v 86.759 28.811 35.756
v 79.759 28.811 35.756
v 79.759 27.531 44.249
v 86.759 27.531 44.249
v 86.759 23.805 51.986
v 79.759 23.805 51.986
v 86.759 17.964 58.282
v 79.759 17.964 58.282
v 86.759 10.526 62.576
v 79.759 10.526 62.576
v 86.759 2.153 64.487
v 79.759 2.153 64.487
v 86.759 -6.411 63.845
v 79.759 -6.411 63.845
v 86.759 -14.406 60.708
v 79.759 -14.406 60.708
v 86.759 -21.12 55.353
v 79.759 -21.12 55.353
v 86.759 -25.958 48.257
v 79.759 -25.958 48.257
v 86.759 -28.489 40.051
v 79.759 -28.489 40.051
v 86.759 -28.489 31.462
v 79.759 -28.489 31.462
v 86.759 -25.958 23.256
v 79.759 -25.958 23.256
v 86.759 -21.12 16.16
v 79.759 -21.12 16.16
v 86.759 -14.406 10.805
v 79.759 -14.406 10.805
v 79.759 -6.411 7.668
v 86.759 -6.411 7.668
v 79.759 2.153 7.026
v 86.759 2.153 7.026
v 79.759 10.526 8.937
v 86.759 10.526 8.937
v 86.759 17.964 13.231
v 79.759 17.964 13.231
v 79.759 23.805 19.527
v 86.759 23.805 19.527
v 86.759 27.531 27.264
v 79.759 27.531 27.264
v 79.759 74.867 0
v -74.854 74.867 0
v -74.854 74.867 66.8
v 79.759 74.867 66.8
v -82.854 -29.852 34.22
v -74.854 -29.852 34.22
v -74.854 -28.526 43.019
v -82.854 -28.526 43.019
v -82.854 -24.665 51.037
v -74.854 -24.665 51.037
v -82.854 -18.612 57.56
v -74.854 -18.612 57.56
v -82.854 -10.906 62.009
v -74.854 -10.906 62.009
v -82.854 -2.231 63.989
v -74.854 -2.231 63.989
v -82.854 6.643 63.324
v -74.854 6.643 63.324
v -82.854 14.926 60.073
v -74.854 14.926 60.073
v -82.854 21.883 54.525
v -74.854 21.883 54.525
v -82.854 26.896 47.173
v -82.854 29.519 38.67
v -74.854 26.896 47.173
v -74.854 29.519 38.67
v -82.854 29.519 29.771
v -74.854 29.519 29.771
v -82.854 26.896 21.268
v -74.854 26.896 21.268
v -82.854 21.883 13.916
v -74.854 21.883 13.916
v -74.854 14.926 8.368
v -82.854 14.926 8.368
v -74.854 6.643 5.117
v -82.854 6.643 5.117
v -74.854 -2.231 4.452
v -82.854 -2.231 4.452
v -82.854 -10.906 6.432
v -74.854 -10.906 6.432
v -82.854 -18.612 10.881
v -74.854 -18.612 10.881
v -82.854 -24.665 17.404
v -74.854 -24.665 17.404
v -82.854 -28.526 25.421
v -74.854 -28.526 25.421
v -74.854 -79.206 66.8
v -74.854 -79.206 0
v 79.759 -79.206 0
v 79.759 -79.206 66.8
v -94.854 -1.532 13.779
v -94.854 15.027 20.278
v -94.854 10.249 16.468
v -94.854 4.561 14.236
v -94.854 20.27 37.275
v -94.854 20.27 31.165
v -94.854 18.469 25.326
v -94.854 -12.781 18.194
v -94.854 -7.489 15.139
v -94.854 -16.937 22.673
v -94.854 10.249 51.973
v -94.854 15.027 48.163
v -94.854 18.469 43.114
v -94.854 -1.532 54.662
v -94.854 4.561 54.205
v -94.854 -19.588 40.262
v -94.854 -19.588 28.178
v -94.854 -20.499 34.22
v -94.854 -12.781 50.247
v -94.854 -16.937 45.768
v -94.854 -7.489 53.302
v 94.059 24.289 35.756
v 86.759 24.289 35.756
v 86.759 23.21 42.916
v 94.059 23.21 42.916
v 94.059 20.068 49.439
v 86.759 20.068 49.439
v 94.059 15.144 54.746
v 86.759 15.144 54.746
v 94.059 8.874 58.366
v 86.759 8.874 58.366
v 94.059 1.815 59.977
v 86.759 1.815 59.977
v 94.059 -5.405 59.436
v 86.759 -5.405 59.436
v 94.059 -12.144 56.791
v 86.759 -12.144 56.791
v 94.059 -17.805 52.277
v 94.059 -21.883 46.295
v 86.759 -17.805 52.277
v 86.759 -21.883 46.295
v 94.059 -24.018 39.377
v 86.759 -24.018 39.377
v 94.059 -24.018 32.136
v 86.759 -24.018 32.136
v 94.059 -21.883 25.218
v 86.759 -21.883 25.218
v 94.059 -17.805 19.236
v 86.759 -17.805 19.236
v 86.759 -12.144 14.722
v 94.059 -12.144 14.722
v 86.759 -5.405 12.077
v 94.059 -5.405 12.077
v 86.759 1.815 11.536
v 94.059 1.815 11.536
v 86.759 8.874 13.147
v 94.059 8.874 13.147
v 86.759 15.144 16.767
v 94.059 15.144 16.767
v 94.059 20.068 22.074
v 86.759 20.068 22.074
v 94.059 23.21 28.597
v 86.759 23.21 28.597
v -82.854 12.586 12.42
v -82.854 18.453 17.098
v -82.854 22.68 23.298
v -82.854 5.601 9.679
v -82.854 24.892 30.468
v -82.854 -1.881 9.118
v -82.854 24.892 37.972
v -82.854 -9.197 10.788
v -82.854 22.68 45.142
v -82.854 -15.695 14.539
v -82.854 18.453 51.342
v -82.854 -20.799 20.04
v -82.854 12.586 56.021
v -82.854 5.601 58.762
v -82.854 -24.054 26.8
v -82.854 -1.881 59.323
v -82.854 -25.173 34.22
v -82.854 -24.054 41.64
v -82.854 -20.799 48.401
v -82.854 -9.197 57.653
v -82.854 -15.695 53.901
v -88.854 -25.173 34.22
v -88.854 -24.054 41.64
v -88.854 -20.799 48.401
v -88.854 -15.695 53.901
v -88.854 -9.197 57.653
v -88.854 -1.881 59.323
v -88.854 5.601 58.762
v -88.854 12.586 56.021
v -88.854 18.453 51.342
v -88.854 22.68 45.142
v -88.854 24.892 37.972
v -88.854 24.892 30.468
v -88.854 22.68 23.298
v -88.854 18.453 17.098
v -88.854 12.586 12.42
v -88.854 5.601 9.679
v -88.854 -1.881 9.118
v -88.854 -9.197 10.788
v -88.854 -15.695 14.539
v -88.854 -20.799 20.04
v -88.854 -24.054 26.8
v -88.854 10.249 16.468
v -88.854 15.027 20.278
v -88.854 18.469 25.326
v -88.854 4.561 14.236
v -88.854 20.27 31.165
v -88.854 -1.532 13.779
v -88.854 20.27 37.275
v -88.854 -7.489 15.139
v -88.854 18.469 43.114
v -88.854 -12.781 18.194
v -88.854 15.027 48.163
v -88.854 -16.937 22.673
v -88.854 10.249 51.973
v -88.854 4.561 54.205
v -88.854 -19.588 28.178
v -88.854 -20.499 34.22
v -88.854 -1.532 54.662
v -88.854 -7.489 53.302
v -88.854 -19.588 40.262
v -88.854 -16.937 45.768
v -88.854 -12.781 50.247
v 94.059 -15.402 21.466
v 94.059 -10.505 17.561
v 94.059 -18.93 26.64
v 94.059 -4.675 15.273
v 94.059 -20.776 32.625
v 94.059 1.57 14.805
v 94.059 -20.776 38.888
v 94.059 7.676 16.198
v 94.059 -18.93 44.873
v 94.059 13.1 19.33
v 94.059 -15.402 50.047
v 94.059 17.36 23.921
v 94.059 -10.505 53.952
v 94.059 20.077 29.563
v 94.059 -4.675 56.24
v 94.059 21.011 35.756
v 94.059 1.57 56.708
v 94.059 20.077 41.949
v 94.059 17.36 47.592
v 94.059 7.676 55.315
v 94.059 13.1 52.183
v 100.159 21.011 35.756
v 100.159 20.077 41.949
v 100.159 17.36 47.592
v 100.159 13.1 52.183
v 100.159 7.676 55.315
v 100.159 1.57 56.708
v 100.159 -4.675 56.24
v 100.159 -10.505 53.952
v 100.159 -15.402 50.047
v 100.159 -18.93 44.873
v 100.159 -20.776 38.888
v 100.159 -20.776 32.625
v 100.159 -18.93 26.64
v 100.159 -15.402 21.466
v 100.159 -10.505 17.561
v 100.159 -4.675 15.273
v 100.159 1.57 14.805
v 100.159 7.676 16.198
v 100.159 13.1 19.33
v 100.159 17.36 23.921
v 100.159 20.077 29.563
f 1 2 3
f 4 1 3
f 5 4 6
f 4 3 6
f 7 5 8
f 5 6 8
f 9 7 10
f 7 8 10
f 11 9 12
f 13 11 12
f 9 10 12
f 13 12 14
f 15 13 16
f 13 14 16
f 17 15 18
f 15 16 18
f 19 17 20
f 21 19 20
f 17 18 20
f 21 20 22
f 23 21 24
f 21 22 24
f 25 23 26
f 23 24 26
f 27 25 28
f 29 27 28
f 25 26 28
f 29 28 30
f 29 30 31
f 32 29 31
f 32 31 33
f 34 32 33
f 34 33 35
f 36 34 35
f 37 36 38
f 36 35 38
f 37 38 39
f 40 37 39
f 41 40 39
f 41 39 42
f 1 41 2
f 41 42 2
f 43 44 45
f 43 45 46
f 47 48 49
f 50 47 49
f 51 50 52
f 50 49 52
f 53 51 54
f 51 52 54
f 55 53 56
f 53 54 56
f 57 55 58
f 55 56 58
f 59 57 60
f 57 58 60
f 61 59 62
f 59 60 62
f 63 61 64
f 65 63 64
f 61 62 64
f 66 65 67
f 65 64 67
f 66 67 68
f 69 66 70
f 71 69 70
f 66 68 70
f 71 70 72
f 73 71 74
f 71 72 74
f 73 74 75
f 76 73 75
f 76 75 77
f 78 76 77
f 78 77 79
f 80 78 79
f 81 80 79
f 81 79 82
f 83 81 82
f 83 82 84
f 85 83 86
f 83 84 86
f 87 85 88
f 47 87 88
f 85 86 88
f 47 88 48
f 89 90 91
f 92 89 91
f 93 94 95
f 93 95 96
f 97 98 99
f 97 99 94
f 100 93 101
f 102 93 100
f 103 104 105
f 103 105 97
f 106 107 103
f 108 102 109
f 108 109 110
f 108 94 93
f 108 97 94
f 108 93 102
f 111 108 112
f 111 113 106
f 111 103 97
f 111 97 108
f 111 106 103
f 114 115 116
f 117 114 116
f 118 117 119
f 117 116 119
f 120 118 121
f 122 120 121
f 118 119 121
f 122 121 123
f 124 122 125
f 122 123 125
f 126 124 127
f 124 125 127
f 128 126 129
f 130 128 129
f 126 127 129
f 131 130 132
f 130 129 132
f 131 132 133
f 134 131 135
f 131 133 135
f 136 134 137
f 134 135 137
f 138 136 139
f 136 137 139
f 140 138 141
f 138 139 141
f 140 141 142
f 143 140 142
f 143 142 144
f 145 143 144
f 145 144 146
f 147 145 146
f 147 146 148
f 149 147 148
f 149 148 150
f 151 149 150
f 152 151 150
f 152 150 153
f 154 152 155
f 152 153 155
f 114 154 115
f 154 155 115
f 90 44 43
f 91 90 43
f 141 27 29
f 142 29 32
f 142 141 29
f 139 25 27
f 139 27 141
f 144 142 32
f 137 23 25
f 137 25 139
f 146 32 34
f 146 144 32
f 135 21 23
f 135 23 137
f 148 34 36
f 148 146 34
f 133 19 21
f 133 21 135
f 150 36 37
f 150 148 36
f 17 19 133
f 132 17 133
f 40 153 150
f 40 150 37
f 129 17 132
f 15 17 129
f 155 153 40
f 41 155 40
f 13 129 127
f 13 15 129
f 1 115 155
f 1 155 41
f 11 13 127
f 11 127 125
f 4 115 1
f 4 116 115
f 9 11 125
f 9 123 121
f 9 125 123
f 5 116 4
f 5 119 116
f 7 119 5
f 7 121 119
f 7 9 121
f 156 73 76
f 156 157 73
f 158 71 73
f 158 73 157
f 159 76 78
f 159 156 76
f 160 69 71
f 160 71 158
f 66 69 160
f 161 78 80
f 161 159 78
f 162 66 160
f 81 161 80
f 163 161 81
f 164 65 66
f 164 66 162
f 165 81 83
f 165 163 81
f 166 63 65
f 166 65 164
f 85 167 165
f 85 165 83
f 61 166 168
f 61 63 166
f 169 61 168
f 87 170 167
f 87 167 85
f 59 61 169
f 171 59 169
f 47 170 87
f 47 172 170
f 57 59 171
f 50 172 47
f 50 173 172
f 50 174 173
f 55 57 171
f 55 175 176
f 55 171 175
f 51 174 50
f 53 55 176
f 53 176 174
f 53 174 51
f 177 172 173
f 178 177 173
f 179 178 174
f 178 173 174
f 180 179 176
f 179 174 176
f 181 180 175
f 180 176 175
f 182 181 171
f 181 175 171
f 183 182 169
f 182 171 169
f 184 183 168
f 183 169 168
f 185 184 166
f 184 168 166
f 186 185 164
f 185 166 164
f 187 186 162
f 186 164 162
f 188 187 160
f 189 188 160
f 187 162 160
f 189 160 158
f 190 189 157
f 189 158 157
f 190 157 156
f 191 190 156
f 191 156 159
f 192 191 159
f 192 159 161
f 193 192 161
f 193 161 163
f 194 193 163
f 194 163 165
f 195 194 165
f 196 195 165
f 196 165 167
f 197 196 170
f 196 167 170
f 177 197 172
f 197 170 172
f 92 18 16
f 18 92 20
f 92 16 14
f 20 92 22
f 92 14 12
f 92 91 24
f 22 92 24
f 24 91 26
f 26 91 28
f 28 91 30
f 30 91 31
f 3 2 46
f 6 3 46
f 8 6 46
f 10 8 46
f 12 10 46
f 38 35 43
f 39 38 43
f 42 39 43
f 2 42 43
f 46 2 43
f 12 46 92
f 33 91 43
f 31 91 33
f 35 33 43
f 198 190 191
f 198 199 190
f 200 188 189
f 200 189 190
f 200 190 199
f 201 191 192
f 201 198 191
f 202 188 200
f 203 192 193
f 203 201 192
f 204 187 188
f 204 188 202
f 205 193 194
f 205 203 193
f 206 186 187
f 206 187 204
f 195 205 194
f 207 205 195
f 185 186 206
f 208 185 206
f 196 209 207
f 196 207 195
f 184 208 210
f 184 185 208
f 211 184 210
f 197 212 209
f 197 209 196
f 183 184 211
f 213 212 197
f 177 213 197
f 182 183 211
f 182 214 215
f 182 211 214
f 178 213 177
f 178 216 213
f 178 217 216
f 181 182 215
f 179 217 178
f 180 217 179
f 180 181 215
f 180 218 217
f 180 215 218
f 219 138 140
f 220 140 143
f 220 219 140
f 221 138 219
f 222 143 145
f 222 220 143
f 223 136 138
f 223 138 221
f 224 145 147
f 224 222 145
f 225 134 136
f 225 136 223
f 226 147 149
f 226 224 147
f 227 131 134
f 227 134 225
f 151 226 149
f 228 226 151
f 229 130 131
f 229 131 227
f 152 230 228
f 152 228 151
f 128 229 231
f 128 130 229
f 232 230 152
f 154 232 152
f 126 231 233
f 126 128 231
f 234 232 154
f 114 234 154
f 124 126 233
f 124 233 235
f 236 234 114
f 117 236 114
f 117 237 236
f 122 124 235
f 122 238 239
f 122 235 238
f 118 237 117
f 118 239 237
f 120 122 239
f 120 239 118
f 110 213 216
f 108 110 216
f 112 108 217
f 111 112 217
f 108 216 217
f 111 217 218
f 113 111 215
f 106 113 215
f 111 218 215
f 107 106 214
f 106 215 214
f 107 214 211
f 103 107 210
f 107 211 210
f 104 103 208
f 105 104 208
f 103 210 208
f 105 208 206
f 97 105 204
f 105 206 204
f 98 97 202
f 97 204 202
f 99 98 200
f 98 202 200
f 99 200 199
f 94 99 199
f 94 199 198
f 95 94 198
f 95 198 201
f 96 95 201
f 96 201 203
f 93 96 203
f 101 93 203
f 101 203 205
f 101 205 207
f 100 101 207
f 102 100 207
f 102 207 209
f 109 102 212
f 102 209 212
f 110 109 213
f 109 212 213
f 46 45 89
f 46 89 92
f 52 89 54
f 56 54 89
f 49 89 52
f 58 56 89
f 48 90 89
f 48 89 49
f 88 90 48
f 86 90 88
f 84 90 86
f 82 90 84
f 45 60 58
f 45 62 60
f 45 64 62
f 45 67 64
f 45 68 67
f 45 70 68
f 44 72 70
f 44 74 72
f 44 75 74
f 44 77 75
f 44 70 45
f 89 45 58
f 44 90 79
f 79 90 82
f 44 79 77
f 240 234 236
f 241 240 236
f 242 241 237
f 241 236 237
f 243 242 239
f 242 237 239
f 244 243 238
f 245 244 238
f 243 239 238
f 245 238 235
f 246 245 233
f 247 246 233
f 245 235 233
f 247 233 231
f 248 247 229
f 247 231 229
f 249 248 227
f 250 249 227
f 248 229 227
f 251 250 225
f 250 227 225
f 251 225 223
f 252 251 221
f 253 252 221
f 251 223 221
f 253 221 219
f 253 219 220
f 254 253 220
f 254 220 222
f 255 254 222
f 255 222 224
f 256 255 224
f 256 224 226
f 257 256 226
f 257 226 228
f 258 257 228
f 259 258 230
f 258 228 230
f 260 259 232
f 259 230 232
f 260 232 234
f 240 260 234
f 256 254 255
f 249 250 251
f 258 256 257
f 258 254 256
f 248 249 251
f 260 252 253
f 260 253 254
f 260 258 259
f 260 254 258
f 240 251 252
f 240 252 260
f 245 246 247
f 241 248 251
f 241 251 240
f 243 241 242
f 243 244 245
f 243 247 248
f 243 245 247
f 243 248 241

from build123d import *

# Parameters (mm, degrees)
F0_W      = 154.612802
F0_H      = 154.072925
F1_DEPTH  = 66.8
F2_R      = 28.811278
F3_DEPTH  = 7
F4_R      = 24.288847
F5_DEPTH  = 7.3
F6_R      = 21.010708
F7_DEPTH  = 6.1
F8_R      = 29.852046
F9_DEPTH  = 8
F10_R     = 25.172837
F11_DEPTH = 6
F12_R     = 20.49857
F13_DEPTH = 6


with BuildPart() as f1:
    # F0 (on Top) → F1 (new body)
    with BuildSketch(Plane.XY):
        with Locations((2.452422, -2.169334)):
            Rectangle(F0_W, F0_H)
    extrude(amount=F1_DEPTH)

    # F2 (on face) → F3 (join)
    with BuildSketch(Plane.YZ.offset(79.758823)):
        with Locations((0, 35.756472)):
            Circle(F2_R)
    extrude(amount=F3_DEPTH)

    # F4 (on face) → F5 (join)
    with BuildSketch(Plane.YZ.offset(86.758823)):
        with Locations((0, 35.756472)):
            Circle(F4_R)
    extrude(amount=F5_DEPTH)

    # F6 (on face) → F7 (join)
    with BuildSketch(Plane.YZ.offset(94.058823)):
        with Locations((0, 35.756472)):
            Circle(F6_R)
    extrude(amount=F7_DEPTH)

    # F8 (on face) → F9 (join)
    with BuildSketch(Plane(origin=(-74.853979, 0, 0), x_dir=(0, -1, 0), z_dir=(-1, 0, 0))):
        with Locations((0, 34.220316)):
            Circle(F8_R)
    extrude(amount=F9_DEPTH)

    # F10 (on face) → F11 (join)
    with BuildSketch(Plane(origin=(-82.853979, 0, 0), x_dir=(0, -1, 0), z_dir=(-1, 0, 0))):
        with Locations((0, 34.220316)):
            Circle(F10_R)
    extrude(amount=F11_DEPTH)

    # F12 (on face) → F13 (join)
    with BuildSketch(Plane(origin=(-88.853979, 0, 0), x_dir=(0, -1, 0), z_dir=(-1, 0, 0))):
        with Locations((0, 34.220316)):
            Circle(F12_R)
    extrude(amount=F13_DEPTH)


solid = f1.part
